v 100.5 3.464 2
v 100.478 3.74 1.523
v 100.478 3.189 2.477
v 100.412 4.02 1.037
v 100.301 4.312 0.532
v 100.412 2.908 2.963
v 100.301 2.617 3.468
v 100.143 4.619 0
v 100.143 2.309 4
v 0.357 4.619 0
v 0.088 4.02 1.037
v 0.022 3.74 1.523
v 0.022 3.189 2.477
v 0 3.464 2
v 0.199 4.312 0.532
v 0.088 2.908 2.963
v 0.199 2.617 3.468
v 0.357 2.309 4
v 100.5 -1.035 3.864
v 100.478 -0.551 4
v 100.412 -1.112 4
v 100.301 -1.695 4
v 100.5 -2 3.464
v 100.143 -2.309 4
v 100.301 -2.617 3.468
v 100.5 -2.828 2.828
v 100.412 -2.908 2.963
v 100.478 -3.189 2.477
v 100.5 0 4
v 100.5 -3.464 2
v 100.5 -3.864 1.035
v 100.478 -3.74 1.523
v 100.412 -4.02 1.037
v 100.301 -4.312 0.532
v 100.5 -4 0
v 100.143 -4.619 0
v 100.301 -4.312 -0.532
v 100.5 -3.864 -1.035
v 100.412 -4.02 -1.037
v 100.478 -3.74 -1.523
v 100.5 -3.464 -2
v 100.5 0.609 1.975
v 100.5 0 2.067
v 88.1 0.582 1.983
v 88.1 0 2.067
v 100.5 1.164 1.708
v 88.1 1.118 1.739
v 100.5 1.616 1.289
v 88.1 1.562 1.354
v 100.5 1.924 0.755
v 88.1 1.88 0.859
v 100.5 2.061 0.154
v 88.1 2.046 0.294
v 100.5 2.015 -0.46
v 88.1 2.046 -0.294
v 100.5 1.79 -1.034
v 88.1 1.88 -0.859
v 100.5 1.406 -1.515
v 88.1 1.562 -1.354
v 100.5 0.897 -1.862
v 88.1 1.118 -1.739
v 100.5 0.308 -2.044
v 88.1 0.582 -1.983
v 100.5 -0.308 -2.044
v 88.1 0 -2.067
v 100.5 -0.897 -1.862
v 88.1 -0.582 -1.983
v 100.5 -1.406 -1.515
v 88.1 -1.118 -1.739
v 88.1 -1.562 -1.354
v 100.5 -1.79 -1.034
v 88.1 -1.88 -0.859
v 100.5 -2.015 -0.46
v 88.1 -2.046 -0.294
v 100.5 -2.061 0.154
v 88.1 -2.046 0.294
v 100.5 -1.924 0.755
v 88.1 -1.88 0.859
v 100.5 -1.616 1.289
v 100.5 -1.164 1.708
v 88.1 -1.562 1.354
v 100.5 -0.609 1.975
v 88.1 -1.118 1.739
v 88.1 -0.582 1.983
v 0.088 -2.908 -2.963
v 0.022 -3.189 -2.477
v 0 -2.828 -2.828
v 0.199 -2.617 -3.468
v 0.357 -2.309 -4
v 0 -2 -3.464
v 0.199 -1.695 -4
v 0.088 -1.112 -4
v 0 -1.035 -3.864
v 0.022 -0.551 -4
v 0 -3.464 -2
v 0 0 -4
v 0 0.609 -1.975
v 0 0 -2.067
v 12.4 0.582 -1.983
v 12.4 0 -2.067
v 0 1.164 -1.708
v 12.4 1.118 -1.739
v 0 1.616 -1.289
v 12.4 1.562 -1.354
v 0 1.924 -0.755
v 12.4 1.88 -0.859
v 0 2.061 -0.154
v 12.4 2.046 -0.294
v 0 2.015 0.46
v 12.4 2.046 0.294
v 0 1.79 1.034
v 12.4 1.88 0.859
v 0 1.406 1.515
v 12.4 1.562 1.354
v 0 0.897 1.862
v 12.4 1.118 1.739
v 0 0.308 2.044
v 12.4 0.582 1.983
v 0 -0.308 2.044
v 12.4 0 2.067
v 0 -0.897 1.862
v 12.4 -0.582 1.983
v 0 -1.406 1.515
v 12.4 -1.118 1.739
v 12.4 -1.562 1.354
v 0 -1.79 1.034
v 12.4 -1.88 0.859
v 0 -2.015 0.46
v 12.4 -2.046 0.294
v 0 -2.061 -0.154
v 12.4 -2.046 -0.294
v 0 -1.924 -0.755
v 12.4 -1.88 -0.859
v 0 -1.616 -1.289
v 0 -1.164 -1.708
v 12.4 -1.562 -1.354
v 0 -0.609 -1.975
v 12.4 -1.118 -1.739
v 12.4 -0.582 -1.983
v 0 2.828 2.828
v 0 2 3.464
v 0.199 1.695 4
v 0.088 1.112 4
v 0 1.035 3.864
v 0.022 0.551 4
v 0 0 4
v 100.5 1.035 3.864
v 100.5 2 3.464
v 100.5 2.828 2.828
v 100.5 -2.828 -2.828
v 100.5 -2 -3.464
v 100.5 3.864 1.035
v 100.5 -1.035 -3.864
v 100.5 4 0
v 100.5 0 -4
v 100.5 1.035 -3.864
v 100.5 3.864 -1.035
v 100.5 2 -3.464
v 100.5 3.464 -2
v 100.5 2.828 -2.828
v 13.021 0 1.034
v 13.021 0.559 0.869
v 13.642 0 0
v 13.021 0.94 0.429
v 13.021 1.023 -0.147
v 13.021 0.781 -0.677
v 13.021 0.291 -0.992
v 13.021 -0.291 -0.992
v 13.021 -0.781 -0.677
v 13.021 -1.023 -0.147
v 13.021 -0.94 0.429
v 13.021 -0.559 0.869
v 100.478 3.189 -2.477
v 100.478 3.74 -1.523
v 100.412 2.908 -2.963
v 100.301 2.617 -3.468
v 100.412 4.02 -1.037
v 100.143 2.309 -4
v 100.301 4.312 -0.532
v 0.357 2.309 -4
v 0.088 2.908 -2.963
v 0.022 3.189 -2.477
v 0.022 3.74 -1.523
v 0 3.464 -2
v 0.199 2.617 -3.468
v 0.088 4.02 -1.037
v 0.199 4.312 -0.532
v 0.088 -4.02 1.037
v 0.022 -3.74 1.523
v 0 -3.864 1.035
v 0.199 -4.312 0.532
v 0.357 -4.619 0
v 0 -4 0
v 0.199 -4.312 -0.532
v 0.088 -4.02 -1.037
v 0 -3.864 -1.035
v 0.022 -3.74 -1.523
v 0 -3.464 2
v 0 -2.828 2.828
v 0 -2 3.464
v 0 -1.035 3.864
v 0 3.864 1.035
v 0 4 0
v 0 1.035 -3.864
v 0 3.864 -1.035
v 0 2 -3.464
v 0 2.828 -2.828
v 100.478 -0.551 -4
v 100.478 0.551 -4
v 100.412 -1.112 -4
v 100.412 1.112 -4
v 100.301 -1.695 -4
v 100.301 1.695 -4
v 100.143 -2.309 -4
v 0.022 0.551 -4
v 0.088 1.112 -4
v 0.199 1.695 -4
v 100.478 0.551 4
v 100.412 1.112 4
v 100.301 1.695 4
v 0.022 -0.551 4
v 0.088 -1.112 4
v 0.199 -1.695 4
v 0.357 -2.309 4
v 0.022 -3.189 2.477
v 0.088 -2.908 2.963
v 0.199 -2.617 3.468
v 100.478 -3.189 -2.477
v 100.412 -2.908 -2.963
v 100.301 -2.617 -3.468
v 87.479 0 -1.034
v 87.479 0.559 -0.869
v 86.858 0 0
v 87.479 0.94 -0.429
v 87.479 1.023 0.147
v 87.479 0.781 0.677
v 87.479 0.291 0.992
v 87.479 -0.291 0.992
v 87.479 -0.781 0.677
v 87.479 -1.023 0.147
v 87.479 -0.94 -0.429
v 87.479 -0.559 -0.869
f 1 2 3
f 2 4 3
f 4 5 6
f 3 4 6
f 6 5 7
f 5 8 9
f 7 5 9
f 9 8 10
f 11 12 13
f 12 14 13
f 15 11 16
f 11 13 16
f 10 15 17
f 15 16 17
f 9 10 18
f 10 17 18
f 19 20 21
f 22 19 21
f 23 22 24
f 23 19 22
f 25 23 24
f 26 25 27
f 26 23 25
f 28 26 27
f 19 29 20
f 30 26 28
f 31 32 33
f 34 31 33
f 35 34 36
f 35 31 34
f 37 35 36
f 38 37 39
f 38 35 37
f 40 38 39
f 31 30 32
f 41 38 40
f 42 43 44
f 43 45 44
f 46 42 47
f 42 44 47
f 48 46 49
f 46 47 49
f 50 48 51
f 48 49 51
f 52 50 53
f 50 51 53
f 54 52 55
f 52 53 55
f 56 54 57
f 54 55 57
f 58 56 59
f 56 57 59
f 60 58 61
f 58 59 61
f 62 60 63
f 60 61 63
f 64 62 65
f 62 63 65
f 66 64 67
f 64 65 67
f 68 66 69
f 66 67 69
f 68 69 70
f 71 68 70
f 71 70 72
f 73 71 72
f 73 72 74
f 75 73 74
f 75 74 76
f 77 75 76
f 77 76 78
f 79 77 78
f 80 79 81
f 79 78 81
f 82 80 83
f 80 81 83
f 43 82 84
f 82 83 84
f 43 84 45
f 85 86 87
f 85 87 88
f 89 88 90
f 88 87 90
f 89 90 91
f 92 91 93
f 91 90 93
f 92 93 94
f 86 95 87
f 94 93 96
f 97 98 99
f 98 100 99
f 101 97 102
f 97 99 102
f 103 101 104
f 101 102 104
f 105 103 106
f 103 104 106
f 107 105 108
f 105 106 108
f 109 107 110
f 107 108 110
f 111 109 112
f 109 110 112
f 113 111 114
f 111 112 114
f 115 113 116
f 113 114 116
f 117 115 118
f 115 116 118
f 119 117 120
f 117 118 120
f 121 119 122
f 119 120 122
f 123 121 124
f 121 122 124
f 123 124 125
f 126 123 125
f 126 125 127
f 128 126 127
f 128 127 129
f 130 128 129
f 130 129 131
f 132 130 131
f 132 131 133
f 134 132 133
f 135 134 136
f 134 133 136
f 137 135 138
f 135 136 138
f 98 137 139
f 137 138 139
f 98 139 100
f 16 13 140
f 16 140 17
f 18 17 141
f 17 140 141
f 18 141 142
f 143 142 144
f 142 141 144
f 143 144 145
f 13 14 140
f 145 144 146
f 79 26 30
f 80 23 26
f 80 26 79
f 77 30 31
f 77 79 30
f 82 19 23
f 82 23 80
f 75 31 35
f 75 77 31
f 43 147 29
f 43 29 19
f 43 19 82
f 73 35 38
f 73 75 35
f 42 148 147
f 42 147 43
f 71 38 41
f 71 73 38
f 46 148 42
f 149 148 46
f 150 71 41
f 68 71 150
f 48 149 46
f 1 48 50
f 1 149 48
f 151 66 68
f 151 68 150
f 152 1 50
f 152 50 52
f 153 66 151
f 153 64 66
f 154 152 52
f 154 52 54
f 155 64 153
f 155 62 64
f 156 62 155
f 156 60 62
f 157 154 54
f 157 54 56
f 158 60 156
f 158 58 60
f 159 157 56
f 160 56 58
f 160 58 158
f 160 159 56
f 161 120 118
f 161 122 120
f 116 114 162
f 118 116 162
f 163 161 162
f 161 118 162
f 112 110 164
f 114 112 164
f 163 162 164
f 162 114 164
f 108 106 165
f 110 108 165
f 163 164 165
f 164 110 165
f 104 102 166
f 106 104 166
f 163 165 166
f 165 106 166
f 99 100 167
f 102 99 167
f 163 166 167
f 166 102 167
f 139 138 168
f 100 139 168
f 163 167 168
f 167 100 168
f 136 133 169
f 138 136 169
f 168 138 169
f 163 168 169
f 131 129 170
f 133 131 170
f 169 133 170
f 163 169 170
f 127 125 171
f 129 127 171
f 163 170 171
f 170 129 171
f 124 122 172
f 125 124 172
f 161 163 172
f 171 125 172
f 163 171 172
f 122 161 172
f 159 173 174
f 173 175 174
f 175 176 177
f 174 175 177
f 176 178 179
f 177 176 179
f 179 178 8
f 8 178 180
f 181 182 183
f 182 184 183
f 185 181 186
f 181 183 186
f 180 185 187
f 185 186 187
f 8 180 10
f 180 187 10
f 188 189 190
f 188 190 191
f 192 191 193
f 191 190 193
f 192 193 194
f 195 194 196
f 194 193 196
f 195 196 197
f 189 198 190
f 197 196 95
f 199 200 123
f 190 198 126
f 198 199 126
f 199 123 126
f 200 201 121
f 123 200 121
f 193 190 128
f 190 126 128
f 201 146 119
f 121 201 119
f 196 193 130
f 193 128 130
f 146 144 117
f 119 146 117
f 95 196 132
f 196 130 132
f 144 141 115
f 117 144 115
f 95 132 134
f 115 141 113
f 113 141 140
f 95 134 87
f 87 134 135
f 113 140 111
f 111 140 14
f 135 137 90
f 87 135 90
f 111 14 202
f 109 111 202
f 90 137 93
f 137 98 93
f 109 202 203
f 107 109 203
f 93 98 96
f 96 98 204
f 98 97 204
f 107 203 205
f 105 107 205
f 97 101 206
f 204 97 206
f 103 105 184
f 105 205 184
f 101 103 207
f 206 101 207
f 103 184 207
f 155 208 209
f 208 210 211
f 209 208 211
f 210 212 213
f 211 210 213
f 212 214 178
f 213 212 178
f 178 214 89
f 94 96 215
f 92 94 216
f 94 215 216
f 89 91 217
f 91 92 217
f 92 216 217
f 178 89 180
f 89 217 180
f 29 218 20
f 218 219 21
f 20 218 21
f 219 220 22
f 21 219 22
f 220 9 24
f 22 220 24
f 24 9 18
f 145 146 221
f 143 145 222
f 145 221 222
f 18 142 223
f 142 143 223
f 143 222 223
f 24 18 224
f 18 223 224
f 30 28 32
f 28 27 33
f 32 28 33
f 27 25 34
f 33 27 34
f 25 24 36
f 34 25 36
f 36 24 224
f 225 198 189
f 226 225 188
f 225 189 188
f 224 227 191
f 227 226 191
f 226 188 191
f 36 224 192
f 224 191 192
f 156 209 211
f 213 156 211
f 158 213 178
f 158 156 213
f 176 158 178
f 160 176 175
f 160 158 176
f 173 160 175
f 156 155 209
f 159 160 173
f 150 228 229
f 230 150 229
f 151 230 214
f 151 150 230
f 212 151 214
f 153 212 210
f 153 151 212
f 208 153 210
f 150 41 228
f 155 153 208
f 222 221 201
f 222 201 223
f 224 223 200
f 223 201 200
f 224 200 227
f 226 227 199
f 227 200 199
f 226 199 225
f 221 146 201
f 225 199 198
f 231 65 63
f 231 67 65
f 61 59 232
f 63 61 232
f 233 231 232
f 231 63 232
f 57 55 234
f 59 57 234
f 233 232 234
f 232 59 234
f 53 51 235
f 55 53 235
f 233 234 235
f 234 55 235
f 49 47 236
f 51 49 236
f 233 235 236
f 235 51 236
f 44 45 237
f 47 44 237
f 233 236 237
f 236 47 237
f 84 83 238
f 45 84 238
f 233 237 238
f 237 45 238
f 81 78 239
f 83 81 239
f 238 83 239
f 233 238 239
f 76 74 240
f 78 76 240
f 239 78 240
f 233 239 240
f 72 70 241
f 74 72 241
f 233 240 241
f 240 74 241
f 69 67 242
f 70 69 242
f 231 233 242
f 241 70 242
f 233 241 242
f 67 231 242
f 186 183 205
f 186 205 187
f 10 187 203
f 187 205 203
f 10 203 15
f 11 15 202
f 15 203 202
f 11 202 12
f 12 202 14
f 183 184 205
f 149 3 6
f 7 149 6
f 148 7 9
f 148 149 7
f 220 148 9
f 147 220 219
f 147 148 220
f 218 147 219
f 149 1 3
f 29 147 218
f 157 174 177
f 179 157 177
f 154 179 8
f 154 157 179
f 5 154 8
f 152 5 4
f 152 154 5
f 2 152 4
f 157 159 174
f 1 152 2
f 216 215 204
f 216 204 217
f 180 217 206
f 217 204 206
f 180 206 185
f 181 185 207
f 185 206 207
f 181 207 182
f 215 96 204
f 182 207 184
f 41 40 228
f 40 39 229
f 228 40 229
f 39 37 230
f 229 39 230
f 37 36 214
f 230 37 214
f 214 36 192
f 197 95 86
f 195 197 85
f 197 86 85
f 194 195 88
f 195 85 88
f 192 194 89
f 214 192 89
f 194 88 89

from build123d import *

# Parameters (mm, degrees)
BOSS_EXTRUDE1_DEPTH = 100.5
TAP1_D              = 4.134
TAP1_DEPTH          = 12.4
TAP1_TIP            = 1.2419789
TAP2_D              = 4.134
TAP2_DEPTH          = 12.4
TAP2_TIP            = 1.2419789


with BuildPart() as part:
    # Sketch1 → Boss-Extrude1 (new body)
    with BuildSketch(Plane(origin=(0, 0, 0), x_dir=(0, 0, -1), z_dir=(1, 0, 0))):
        Polygon((0, -4.618802154), (4, -2.309401077), (4, 2.309401077), (0, 4.618802154), (-4, 2.309401077), (-4, -2.309401077), align=None)
    extrude(amount=BOSS_EXTRUDE1_DEPTH)

    # Sketch2 → Cut-Revolve1 (revolve, cut)
    with BuildSketch(Plane.XY):
        Polygon((0, 4.618802154), (0.35726559, 4.618802154), (0, 4), align=None)
        Polygon((100.14273441, 4.618802154), (100.5, 4), (100.5, 4.618802154), align=None)
    revolve(axis=Axis((0, 0, 0), (1, 0, 0)), mode=Mode.SUBTRACT)

    # Tap1
    with Locations(Plane.ZY):
        with Locations((0, 0)):
            Hole(TAP1_D / 2, depth=TAP1_DEPTH)
            with Locations((0, 0, -(TAP1_DEPTH + TAP1_TIP / 2))):  # 118° drill point
                Cone(0, TAP1_D / 2, TAP1_TIP, mode=Mode.SUBTRACT)

    # Tap2
    with Locations(Plane(origin=(100.5, 0, 0), x_dir=(0, 0, -1), z_dir=(1, 0, 0))):
        with Locations((0, 0)):
            Hole(TAP2_D / 2, depth=TAP2_DEPTH)
            with Locations((0, 0, -(TAP2_DEPTH + TAP2_TIP / 2))):  # 118° drill point
                Cone(0, TAP2_D / 2, TAP2_TIP, mode=Mode.SUBTRACT)


solid = part.part
